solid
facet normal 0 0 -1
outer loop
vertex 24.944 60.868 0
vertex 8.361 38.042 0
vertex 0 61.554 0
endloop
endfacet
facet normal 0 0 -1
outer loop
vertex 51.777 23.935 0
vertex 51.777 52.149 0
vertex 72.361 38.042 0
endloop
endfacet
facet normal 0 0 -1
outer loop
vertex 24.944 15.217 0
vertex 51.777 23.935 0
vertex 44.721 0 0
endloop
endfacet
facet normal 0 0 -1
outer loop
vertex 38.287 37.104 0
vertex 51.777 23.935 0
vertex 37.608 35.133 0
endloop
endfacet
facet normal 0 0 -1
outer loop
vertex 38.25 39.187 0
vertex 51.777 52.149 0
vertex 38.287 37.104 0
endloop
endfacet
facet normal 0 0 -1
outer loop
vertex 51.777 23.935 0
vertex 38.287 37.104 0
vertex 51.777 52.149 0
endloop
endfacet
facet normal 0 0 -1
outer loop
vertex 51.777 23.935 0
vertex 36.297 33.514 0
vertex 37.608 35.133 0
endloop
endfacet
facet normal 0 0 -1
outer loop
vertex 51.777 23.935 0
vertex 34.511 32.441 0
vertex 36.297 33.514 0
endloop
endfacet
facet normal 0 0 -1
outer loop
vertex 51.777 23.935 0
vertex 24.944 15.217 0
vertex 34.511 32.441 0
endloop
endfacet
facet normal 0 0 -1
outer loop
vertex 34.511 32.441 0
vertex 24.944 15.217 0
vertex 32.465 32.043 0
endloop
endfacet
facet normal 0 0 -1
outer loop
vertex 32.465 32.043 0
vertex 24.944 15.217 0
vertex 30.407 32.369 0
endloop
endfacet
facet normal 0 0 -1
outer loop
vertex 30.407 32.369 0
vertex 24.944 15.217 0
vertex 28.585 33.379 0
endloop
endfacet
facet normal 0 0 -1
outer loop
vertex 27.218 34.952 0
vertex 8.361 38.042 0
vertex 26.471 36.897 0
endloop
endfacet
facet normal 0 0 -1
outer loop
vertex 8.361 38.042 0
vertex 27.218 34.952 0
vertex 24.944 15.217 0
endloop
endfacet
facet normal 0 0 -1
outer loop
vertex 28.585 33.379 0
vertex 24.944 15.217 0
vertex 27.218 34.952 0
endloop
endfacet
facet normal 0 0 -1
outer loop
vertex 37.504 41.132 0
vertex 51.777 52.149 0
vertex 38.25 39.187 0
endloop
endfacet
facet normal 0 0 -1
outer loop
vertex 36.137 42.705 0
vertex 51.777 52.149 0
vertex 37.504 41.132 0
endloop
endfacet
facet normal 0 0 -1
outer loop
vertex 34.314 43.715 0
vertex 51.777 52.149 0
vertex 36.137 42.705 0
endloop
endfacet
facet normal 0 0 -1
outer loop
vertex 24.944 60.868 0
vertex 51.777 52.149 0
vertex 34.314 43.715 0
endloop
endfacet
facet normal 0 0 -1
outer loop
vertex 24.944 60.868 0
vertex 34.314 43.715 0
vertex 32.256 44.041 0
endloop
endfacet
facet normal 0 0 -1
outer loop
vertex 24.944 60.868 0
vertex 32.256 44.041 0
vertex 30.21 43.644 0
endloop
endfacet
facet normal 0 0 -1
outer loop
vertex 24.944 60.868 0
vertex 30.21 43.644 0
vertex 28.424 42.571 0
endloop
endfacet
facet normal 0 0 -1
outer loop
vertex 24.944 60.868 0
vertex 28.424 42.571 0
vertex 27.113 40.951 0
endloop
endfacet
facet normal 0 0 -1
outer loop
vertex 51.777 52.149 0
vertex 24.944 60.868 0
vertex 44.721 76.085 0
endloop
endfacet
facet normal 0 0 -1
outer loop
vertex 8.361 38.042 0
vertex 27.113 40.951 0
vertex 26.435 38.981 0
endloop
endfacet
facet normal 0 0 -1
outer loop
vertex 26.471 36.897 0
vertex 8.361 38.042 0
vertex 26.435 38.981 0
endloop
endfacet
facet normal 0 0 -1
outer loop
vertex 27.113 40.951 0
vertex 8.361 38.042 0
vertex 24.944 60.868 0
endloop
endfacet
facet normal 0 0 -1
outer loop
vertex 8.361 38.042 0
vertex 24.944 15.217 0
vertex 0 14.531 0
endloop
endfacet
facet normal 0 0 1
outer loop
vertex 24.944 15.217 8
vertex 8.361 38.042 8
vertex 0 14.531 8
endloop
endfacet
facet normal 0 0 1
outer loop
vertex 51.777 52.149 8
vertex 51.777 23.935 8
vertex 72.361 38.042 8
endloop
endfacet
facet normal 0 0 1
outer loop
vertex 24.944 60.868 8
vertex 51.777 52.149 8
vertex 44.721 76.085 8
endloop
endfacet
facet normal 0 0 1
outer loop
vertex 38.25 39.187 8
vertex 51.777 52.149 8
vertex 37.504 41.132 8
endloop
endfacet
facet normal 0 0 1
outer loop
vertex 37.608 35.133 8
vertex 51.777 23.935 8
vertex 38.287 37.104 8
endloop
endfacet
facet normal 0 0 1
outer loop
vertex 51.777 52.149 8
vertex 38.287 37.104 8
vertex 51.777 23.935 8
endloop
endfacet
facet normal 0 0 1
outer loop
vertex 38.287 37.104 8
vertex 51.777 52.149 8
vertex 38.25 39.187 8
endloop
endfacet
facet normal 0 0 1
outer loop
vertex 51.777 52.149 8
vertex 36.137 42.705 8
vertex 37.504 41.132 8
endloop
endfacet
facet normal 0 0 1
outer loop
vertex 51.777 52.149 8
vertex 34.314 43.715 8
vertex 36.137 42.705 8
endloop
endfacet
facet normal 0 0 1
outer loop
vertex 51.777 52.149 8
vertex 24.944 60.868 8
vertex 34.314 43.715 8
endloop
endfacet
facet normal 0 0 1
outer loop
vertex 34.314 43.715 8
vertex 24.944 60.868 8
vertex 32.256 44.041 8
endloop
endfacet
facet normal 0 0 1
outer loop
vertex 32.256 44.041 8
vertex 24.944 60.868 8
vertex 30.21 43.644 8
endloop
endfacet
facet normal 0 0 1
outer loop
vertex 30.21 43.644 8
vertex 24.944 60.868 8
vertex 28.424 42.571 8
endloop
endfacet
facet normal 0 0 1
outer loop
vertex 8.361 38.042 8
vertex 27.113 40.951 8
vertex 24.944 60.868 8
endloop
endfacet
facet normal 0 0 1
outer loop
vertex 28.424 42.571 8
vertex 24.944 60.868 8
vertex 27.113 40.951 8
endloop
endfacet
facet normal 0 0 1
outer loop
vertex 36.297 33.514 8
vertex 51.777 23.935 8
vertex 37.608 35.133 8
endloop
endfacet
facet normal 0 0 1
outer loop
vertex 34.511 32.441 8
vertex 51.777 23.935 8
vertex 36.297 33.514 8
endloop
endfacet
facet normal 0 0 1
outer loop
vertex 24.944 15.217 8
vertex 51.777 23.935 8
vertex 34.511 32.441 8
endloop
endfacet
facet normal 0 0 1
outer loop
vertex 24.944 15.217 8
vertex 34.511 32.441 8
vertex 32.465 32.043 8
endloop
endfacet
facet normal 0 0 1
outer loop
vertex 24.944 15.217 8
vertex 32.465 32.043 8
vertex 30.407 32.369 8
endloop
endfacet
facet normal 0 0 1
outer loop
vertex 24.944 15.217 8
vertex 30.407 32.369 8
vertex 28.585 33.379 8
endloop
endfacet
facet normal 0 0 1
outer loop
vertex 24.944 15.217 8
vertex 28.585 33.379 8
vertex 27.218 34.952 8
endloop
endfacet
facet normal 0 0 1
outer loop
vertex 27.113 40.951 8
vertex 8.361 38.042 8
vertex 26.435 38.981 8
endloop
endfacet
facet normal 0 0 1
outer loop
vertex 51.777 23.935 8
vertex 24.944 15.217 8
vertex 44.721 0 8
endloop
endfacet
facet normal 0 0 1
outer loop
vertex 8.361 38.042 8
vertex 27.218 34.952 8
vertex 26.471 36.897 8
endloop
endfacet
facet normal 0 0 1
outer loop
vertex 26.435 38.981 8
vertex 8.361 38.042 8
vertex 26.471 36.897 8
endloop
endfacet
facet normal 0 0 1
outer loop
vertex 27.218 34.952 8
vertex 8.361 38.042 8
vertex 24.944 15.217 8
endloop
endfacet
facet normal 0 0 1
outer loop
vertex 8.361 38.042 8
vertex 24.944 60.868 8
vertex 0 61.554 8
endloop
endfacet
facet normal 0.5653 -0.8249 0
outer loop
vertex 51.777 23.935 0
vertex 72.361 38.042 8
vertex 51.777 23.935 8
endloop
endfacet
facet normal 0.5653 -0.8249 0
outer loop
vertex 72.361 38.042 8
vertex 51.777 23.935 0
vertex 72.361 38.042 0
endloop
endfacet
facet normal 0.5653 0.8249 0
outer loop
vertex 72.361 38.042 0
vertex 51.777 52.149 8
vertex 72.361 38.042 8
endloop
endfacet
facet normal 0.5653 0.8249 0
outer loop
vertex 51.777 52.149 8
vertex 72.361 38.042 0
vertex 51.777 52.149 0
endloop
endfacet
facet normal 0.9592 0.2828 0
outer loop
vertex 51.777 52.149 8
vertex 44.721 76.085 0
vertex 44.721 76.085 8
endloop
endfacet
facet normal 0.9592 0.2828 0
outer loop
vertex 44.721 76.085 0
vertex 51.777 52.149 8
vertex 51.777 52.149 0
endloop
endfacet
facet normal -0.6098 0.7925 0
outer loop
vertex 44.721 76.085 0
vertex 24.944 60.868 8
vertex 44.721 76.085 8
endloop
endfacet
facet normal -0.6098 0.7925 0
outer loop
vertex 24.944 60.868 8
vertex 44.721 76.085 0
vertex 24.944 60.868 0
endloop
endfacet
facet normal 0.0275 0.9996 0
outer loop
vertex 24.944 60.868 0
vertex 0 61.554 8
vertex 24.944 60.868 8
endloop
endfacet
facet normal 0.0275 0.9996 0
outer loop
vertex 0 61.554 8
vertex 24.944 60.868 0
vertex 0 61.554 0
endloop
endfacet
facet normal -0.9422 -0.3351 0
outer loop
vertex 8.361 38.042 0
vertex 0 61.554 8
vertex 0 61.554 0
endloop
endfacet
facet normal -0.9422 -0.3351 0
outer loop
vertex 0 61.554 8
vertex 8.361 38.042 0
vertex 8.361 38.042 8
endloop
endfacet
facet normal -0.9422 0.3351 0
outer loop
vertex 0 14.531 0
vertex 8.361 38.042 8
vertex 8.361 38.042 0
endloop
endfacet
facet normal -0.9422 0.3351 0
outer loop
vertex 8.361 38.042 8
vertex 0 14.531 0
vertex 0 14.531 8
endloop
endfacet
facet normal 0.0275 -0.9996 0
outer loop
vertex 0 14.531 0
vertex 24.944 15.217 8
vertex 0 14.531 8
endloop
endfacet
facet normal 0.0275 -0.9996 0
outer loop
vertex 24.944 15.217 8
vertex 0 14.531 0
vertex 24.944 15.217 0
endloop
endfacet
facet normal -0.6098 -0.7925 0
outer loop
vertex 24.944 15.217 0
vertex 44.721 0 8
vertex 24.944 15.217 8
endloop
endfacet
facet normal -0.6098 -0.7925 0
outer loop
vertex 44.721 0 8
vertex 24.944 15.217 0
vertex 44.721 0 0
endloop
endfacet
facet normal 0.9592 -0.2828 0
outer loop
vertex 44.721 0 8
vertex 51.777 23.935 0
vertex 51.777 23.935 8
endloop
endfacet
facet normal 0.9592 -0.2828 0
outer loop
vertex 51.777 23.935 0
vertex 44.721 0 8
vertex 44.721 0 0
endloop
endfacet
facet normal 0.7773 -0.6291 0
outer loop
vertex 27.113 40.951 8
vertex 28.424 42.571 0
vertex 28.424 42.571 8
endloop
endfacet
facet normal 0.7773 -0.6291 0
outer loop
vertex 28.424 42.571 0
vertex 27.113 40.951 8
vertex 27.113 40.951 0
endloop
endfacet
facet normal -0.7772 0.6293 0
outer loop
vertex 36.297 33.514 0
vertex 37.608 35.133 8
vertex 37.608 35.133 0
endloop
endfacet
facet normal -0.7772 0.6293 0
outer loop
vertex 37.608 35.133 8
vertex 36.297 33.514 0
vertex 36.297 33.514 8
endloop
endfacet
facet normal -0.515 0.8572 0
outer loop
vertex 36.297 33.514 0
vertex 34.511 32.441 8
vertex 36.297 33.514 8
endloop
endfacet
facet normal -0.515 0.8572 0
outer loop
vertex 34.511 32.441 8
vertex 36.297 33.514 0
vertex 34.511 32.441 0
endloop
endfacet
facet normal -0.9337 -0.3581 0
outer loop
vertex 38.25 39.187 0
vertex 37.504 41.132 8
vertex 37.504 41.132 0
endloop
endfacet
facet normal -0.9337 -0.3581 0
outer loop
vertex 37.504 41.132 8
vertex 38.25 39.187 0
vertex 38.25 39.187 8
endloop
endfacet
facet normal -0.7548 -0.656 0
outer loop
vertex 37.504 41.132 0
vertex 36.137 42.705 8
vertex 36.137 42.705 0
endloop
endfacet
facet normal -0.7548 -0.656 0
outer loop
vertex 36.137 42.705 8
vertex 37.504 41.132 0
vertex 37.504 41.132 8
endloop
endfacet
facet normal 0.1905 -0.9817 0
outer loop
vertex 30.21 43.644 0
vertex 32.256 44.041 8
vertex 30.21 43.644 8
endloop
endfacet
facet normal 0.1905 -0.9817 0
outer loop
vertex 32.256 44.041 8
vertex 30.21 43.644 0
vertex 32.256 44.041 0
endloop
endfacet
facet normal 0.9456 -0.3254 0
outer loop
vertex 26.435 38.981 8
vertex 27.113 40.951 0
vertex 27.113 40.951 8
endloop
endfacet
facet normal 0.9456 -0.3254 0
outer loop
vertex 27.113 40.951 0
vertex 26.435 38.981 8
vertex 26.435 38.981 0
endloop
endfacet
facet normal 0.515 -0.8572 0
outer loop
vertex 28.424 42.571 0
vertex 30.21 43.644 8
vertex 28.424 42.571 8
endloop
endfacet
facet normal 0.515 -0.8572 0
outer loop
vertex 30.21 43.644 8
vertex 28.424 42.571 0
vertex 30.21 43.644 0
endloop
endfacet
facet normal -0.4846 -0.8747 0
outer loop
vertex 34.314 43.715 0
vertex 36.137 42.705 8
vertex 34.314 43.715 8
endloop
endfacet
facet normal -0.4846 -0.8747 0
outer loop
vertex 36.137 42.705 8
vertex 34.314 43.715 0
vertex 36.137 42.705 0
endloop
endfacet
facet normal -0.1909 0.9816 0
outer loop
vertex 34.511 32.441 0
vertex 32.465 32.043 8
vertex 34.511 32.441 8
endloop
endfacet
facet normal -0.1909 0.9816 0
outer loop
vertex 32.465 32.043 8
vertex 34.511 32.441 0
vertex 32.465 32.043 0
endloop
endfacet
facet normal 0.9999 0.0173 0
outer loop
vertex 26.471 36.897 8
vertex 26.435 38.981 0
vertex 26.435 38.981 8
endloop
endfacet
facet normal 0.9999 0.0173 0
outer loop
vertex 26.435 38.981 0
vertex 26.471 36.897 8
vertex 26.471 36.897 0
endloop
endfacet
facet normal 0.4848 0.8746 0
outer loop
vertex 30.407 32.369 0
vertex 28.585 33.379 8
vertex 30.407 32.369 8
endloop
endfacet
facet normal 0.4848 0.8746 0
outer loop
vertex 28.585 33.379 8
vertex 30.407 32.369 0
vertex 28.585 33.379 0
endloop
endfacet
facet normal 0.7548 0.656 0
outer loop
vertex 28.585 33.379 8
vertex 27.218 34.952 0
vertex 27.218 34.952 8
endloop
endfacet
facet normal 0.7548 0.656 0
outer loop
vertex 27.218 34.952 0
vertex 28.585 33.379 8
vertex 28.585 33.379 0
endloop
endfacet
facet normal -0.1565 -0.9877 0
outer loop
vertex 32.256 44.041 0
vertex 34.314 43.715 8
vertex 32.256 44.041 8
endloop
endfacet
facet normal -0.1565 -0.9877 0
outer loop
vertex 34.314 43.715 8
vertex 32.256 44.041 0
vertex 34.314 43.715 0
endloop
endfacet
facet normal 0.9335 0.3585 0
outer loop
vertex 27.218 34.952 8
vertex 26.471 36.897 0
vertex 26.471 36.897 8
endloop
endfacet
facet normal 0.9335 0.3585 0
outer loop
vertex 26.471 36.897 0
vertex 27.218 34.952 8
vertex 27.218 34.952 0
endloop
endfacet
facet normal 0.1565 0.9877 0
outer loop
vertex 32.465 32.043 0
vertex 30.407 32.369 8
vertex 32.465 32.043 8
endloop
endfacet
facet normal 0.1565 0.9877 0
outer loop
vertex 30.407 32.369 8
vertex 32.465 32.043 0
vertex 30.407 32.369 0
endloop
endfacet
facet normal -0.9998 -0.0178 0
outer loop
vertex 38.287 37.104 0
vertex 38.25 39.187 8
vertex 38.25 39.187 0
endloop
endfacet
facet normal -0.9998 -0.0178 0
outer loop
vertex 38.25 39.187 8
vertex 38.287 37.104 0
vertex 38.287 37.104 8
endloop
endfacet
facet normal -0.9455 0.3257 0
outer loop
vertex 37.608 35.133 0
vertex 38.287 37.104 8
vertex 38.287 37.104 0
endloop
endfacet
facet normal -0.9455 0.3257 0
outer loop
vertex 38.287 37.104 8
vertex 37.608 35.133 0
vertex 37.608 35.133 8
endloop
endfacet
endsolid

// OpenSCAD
$fn = 32;

// ----------------------------------------------------------------------
// Star wheel: 5-point star, R40
// ----------------------------------------------------------------------

// --- parameters (mm) ---
n_points = 5;             // number of points / teeth
r_out = 40;               // tip radius
r_in = 24;                // root radius
bore_r = 6;               // centre bore radius
plate_t = 8;              // plate thickness, Z (extrusion height)
bore_d = 12;              // centre bore diameter

profile = [[72.361, 38.042], [51.777, 52.149], [44.721, 76.085], [24.944, 60.868], [0, 61.554], [8.361, 38.042], [0, 14.531], [24.944, 15.217], [44.721, 0], [51.777, 23.935]];  // primary outline, 10 points, counter clockwise
void_1 = [[38.25, 39.187], [37.504, 41.132], [36.137, 42.705], [34.314, 43.715], [32.256, 44.041], [30.21, 43.644], [28.424, 42.571], [27.113, 40.951], [26.435, 38.981], [26.471, 36.897], [27.218, 34.952], [28.585, 33.379], [30.407, 32.369], [32.465, 32.043], [34.511, 32.441], [36.297, 33.514], [37.608, 35.133], [38.287, 37.104]];  // centre bore, 18 points

// --- the one profile operation ---
difference() {
  linear_extrude(height = plate_t) polygon(points = profile);
  translate([0, 0, -1])
    linear_extrude(height = plate_t + 2) polygon(points = void_1);
}
